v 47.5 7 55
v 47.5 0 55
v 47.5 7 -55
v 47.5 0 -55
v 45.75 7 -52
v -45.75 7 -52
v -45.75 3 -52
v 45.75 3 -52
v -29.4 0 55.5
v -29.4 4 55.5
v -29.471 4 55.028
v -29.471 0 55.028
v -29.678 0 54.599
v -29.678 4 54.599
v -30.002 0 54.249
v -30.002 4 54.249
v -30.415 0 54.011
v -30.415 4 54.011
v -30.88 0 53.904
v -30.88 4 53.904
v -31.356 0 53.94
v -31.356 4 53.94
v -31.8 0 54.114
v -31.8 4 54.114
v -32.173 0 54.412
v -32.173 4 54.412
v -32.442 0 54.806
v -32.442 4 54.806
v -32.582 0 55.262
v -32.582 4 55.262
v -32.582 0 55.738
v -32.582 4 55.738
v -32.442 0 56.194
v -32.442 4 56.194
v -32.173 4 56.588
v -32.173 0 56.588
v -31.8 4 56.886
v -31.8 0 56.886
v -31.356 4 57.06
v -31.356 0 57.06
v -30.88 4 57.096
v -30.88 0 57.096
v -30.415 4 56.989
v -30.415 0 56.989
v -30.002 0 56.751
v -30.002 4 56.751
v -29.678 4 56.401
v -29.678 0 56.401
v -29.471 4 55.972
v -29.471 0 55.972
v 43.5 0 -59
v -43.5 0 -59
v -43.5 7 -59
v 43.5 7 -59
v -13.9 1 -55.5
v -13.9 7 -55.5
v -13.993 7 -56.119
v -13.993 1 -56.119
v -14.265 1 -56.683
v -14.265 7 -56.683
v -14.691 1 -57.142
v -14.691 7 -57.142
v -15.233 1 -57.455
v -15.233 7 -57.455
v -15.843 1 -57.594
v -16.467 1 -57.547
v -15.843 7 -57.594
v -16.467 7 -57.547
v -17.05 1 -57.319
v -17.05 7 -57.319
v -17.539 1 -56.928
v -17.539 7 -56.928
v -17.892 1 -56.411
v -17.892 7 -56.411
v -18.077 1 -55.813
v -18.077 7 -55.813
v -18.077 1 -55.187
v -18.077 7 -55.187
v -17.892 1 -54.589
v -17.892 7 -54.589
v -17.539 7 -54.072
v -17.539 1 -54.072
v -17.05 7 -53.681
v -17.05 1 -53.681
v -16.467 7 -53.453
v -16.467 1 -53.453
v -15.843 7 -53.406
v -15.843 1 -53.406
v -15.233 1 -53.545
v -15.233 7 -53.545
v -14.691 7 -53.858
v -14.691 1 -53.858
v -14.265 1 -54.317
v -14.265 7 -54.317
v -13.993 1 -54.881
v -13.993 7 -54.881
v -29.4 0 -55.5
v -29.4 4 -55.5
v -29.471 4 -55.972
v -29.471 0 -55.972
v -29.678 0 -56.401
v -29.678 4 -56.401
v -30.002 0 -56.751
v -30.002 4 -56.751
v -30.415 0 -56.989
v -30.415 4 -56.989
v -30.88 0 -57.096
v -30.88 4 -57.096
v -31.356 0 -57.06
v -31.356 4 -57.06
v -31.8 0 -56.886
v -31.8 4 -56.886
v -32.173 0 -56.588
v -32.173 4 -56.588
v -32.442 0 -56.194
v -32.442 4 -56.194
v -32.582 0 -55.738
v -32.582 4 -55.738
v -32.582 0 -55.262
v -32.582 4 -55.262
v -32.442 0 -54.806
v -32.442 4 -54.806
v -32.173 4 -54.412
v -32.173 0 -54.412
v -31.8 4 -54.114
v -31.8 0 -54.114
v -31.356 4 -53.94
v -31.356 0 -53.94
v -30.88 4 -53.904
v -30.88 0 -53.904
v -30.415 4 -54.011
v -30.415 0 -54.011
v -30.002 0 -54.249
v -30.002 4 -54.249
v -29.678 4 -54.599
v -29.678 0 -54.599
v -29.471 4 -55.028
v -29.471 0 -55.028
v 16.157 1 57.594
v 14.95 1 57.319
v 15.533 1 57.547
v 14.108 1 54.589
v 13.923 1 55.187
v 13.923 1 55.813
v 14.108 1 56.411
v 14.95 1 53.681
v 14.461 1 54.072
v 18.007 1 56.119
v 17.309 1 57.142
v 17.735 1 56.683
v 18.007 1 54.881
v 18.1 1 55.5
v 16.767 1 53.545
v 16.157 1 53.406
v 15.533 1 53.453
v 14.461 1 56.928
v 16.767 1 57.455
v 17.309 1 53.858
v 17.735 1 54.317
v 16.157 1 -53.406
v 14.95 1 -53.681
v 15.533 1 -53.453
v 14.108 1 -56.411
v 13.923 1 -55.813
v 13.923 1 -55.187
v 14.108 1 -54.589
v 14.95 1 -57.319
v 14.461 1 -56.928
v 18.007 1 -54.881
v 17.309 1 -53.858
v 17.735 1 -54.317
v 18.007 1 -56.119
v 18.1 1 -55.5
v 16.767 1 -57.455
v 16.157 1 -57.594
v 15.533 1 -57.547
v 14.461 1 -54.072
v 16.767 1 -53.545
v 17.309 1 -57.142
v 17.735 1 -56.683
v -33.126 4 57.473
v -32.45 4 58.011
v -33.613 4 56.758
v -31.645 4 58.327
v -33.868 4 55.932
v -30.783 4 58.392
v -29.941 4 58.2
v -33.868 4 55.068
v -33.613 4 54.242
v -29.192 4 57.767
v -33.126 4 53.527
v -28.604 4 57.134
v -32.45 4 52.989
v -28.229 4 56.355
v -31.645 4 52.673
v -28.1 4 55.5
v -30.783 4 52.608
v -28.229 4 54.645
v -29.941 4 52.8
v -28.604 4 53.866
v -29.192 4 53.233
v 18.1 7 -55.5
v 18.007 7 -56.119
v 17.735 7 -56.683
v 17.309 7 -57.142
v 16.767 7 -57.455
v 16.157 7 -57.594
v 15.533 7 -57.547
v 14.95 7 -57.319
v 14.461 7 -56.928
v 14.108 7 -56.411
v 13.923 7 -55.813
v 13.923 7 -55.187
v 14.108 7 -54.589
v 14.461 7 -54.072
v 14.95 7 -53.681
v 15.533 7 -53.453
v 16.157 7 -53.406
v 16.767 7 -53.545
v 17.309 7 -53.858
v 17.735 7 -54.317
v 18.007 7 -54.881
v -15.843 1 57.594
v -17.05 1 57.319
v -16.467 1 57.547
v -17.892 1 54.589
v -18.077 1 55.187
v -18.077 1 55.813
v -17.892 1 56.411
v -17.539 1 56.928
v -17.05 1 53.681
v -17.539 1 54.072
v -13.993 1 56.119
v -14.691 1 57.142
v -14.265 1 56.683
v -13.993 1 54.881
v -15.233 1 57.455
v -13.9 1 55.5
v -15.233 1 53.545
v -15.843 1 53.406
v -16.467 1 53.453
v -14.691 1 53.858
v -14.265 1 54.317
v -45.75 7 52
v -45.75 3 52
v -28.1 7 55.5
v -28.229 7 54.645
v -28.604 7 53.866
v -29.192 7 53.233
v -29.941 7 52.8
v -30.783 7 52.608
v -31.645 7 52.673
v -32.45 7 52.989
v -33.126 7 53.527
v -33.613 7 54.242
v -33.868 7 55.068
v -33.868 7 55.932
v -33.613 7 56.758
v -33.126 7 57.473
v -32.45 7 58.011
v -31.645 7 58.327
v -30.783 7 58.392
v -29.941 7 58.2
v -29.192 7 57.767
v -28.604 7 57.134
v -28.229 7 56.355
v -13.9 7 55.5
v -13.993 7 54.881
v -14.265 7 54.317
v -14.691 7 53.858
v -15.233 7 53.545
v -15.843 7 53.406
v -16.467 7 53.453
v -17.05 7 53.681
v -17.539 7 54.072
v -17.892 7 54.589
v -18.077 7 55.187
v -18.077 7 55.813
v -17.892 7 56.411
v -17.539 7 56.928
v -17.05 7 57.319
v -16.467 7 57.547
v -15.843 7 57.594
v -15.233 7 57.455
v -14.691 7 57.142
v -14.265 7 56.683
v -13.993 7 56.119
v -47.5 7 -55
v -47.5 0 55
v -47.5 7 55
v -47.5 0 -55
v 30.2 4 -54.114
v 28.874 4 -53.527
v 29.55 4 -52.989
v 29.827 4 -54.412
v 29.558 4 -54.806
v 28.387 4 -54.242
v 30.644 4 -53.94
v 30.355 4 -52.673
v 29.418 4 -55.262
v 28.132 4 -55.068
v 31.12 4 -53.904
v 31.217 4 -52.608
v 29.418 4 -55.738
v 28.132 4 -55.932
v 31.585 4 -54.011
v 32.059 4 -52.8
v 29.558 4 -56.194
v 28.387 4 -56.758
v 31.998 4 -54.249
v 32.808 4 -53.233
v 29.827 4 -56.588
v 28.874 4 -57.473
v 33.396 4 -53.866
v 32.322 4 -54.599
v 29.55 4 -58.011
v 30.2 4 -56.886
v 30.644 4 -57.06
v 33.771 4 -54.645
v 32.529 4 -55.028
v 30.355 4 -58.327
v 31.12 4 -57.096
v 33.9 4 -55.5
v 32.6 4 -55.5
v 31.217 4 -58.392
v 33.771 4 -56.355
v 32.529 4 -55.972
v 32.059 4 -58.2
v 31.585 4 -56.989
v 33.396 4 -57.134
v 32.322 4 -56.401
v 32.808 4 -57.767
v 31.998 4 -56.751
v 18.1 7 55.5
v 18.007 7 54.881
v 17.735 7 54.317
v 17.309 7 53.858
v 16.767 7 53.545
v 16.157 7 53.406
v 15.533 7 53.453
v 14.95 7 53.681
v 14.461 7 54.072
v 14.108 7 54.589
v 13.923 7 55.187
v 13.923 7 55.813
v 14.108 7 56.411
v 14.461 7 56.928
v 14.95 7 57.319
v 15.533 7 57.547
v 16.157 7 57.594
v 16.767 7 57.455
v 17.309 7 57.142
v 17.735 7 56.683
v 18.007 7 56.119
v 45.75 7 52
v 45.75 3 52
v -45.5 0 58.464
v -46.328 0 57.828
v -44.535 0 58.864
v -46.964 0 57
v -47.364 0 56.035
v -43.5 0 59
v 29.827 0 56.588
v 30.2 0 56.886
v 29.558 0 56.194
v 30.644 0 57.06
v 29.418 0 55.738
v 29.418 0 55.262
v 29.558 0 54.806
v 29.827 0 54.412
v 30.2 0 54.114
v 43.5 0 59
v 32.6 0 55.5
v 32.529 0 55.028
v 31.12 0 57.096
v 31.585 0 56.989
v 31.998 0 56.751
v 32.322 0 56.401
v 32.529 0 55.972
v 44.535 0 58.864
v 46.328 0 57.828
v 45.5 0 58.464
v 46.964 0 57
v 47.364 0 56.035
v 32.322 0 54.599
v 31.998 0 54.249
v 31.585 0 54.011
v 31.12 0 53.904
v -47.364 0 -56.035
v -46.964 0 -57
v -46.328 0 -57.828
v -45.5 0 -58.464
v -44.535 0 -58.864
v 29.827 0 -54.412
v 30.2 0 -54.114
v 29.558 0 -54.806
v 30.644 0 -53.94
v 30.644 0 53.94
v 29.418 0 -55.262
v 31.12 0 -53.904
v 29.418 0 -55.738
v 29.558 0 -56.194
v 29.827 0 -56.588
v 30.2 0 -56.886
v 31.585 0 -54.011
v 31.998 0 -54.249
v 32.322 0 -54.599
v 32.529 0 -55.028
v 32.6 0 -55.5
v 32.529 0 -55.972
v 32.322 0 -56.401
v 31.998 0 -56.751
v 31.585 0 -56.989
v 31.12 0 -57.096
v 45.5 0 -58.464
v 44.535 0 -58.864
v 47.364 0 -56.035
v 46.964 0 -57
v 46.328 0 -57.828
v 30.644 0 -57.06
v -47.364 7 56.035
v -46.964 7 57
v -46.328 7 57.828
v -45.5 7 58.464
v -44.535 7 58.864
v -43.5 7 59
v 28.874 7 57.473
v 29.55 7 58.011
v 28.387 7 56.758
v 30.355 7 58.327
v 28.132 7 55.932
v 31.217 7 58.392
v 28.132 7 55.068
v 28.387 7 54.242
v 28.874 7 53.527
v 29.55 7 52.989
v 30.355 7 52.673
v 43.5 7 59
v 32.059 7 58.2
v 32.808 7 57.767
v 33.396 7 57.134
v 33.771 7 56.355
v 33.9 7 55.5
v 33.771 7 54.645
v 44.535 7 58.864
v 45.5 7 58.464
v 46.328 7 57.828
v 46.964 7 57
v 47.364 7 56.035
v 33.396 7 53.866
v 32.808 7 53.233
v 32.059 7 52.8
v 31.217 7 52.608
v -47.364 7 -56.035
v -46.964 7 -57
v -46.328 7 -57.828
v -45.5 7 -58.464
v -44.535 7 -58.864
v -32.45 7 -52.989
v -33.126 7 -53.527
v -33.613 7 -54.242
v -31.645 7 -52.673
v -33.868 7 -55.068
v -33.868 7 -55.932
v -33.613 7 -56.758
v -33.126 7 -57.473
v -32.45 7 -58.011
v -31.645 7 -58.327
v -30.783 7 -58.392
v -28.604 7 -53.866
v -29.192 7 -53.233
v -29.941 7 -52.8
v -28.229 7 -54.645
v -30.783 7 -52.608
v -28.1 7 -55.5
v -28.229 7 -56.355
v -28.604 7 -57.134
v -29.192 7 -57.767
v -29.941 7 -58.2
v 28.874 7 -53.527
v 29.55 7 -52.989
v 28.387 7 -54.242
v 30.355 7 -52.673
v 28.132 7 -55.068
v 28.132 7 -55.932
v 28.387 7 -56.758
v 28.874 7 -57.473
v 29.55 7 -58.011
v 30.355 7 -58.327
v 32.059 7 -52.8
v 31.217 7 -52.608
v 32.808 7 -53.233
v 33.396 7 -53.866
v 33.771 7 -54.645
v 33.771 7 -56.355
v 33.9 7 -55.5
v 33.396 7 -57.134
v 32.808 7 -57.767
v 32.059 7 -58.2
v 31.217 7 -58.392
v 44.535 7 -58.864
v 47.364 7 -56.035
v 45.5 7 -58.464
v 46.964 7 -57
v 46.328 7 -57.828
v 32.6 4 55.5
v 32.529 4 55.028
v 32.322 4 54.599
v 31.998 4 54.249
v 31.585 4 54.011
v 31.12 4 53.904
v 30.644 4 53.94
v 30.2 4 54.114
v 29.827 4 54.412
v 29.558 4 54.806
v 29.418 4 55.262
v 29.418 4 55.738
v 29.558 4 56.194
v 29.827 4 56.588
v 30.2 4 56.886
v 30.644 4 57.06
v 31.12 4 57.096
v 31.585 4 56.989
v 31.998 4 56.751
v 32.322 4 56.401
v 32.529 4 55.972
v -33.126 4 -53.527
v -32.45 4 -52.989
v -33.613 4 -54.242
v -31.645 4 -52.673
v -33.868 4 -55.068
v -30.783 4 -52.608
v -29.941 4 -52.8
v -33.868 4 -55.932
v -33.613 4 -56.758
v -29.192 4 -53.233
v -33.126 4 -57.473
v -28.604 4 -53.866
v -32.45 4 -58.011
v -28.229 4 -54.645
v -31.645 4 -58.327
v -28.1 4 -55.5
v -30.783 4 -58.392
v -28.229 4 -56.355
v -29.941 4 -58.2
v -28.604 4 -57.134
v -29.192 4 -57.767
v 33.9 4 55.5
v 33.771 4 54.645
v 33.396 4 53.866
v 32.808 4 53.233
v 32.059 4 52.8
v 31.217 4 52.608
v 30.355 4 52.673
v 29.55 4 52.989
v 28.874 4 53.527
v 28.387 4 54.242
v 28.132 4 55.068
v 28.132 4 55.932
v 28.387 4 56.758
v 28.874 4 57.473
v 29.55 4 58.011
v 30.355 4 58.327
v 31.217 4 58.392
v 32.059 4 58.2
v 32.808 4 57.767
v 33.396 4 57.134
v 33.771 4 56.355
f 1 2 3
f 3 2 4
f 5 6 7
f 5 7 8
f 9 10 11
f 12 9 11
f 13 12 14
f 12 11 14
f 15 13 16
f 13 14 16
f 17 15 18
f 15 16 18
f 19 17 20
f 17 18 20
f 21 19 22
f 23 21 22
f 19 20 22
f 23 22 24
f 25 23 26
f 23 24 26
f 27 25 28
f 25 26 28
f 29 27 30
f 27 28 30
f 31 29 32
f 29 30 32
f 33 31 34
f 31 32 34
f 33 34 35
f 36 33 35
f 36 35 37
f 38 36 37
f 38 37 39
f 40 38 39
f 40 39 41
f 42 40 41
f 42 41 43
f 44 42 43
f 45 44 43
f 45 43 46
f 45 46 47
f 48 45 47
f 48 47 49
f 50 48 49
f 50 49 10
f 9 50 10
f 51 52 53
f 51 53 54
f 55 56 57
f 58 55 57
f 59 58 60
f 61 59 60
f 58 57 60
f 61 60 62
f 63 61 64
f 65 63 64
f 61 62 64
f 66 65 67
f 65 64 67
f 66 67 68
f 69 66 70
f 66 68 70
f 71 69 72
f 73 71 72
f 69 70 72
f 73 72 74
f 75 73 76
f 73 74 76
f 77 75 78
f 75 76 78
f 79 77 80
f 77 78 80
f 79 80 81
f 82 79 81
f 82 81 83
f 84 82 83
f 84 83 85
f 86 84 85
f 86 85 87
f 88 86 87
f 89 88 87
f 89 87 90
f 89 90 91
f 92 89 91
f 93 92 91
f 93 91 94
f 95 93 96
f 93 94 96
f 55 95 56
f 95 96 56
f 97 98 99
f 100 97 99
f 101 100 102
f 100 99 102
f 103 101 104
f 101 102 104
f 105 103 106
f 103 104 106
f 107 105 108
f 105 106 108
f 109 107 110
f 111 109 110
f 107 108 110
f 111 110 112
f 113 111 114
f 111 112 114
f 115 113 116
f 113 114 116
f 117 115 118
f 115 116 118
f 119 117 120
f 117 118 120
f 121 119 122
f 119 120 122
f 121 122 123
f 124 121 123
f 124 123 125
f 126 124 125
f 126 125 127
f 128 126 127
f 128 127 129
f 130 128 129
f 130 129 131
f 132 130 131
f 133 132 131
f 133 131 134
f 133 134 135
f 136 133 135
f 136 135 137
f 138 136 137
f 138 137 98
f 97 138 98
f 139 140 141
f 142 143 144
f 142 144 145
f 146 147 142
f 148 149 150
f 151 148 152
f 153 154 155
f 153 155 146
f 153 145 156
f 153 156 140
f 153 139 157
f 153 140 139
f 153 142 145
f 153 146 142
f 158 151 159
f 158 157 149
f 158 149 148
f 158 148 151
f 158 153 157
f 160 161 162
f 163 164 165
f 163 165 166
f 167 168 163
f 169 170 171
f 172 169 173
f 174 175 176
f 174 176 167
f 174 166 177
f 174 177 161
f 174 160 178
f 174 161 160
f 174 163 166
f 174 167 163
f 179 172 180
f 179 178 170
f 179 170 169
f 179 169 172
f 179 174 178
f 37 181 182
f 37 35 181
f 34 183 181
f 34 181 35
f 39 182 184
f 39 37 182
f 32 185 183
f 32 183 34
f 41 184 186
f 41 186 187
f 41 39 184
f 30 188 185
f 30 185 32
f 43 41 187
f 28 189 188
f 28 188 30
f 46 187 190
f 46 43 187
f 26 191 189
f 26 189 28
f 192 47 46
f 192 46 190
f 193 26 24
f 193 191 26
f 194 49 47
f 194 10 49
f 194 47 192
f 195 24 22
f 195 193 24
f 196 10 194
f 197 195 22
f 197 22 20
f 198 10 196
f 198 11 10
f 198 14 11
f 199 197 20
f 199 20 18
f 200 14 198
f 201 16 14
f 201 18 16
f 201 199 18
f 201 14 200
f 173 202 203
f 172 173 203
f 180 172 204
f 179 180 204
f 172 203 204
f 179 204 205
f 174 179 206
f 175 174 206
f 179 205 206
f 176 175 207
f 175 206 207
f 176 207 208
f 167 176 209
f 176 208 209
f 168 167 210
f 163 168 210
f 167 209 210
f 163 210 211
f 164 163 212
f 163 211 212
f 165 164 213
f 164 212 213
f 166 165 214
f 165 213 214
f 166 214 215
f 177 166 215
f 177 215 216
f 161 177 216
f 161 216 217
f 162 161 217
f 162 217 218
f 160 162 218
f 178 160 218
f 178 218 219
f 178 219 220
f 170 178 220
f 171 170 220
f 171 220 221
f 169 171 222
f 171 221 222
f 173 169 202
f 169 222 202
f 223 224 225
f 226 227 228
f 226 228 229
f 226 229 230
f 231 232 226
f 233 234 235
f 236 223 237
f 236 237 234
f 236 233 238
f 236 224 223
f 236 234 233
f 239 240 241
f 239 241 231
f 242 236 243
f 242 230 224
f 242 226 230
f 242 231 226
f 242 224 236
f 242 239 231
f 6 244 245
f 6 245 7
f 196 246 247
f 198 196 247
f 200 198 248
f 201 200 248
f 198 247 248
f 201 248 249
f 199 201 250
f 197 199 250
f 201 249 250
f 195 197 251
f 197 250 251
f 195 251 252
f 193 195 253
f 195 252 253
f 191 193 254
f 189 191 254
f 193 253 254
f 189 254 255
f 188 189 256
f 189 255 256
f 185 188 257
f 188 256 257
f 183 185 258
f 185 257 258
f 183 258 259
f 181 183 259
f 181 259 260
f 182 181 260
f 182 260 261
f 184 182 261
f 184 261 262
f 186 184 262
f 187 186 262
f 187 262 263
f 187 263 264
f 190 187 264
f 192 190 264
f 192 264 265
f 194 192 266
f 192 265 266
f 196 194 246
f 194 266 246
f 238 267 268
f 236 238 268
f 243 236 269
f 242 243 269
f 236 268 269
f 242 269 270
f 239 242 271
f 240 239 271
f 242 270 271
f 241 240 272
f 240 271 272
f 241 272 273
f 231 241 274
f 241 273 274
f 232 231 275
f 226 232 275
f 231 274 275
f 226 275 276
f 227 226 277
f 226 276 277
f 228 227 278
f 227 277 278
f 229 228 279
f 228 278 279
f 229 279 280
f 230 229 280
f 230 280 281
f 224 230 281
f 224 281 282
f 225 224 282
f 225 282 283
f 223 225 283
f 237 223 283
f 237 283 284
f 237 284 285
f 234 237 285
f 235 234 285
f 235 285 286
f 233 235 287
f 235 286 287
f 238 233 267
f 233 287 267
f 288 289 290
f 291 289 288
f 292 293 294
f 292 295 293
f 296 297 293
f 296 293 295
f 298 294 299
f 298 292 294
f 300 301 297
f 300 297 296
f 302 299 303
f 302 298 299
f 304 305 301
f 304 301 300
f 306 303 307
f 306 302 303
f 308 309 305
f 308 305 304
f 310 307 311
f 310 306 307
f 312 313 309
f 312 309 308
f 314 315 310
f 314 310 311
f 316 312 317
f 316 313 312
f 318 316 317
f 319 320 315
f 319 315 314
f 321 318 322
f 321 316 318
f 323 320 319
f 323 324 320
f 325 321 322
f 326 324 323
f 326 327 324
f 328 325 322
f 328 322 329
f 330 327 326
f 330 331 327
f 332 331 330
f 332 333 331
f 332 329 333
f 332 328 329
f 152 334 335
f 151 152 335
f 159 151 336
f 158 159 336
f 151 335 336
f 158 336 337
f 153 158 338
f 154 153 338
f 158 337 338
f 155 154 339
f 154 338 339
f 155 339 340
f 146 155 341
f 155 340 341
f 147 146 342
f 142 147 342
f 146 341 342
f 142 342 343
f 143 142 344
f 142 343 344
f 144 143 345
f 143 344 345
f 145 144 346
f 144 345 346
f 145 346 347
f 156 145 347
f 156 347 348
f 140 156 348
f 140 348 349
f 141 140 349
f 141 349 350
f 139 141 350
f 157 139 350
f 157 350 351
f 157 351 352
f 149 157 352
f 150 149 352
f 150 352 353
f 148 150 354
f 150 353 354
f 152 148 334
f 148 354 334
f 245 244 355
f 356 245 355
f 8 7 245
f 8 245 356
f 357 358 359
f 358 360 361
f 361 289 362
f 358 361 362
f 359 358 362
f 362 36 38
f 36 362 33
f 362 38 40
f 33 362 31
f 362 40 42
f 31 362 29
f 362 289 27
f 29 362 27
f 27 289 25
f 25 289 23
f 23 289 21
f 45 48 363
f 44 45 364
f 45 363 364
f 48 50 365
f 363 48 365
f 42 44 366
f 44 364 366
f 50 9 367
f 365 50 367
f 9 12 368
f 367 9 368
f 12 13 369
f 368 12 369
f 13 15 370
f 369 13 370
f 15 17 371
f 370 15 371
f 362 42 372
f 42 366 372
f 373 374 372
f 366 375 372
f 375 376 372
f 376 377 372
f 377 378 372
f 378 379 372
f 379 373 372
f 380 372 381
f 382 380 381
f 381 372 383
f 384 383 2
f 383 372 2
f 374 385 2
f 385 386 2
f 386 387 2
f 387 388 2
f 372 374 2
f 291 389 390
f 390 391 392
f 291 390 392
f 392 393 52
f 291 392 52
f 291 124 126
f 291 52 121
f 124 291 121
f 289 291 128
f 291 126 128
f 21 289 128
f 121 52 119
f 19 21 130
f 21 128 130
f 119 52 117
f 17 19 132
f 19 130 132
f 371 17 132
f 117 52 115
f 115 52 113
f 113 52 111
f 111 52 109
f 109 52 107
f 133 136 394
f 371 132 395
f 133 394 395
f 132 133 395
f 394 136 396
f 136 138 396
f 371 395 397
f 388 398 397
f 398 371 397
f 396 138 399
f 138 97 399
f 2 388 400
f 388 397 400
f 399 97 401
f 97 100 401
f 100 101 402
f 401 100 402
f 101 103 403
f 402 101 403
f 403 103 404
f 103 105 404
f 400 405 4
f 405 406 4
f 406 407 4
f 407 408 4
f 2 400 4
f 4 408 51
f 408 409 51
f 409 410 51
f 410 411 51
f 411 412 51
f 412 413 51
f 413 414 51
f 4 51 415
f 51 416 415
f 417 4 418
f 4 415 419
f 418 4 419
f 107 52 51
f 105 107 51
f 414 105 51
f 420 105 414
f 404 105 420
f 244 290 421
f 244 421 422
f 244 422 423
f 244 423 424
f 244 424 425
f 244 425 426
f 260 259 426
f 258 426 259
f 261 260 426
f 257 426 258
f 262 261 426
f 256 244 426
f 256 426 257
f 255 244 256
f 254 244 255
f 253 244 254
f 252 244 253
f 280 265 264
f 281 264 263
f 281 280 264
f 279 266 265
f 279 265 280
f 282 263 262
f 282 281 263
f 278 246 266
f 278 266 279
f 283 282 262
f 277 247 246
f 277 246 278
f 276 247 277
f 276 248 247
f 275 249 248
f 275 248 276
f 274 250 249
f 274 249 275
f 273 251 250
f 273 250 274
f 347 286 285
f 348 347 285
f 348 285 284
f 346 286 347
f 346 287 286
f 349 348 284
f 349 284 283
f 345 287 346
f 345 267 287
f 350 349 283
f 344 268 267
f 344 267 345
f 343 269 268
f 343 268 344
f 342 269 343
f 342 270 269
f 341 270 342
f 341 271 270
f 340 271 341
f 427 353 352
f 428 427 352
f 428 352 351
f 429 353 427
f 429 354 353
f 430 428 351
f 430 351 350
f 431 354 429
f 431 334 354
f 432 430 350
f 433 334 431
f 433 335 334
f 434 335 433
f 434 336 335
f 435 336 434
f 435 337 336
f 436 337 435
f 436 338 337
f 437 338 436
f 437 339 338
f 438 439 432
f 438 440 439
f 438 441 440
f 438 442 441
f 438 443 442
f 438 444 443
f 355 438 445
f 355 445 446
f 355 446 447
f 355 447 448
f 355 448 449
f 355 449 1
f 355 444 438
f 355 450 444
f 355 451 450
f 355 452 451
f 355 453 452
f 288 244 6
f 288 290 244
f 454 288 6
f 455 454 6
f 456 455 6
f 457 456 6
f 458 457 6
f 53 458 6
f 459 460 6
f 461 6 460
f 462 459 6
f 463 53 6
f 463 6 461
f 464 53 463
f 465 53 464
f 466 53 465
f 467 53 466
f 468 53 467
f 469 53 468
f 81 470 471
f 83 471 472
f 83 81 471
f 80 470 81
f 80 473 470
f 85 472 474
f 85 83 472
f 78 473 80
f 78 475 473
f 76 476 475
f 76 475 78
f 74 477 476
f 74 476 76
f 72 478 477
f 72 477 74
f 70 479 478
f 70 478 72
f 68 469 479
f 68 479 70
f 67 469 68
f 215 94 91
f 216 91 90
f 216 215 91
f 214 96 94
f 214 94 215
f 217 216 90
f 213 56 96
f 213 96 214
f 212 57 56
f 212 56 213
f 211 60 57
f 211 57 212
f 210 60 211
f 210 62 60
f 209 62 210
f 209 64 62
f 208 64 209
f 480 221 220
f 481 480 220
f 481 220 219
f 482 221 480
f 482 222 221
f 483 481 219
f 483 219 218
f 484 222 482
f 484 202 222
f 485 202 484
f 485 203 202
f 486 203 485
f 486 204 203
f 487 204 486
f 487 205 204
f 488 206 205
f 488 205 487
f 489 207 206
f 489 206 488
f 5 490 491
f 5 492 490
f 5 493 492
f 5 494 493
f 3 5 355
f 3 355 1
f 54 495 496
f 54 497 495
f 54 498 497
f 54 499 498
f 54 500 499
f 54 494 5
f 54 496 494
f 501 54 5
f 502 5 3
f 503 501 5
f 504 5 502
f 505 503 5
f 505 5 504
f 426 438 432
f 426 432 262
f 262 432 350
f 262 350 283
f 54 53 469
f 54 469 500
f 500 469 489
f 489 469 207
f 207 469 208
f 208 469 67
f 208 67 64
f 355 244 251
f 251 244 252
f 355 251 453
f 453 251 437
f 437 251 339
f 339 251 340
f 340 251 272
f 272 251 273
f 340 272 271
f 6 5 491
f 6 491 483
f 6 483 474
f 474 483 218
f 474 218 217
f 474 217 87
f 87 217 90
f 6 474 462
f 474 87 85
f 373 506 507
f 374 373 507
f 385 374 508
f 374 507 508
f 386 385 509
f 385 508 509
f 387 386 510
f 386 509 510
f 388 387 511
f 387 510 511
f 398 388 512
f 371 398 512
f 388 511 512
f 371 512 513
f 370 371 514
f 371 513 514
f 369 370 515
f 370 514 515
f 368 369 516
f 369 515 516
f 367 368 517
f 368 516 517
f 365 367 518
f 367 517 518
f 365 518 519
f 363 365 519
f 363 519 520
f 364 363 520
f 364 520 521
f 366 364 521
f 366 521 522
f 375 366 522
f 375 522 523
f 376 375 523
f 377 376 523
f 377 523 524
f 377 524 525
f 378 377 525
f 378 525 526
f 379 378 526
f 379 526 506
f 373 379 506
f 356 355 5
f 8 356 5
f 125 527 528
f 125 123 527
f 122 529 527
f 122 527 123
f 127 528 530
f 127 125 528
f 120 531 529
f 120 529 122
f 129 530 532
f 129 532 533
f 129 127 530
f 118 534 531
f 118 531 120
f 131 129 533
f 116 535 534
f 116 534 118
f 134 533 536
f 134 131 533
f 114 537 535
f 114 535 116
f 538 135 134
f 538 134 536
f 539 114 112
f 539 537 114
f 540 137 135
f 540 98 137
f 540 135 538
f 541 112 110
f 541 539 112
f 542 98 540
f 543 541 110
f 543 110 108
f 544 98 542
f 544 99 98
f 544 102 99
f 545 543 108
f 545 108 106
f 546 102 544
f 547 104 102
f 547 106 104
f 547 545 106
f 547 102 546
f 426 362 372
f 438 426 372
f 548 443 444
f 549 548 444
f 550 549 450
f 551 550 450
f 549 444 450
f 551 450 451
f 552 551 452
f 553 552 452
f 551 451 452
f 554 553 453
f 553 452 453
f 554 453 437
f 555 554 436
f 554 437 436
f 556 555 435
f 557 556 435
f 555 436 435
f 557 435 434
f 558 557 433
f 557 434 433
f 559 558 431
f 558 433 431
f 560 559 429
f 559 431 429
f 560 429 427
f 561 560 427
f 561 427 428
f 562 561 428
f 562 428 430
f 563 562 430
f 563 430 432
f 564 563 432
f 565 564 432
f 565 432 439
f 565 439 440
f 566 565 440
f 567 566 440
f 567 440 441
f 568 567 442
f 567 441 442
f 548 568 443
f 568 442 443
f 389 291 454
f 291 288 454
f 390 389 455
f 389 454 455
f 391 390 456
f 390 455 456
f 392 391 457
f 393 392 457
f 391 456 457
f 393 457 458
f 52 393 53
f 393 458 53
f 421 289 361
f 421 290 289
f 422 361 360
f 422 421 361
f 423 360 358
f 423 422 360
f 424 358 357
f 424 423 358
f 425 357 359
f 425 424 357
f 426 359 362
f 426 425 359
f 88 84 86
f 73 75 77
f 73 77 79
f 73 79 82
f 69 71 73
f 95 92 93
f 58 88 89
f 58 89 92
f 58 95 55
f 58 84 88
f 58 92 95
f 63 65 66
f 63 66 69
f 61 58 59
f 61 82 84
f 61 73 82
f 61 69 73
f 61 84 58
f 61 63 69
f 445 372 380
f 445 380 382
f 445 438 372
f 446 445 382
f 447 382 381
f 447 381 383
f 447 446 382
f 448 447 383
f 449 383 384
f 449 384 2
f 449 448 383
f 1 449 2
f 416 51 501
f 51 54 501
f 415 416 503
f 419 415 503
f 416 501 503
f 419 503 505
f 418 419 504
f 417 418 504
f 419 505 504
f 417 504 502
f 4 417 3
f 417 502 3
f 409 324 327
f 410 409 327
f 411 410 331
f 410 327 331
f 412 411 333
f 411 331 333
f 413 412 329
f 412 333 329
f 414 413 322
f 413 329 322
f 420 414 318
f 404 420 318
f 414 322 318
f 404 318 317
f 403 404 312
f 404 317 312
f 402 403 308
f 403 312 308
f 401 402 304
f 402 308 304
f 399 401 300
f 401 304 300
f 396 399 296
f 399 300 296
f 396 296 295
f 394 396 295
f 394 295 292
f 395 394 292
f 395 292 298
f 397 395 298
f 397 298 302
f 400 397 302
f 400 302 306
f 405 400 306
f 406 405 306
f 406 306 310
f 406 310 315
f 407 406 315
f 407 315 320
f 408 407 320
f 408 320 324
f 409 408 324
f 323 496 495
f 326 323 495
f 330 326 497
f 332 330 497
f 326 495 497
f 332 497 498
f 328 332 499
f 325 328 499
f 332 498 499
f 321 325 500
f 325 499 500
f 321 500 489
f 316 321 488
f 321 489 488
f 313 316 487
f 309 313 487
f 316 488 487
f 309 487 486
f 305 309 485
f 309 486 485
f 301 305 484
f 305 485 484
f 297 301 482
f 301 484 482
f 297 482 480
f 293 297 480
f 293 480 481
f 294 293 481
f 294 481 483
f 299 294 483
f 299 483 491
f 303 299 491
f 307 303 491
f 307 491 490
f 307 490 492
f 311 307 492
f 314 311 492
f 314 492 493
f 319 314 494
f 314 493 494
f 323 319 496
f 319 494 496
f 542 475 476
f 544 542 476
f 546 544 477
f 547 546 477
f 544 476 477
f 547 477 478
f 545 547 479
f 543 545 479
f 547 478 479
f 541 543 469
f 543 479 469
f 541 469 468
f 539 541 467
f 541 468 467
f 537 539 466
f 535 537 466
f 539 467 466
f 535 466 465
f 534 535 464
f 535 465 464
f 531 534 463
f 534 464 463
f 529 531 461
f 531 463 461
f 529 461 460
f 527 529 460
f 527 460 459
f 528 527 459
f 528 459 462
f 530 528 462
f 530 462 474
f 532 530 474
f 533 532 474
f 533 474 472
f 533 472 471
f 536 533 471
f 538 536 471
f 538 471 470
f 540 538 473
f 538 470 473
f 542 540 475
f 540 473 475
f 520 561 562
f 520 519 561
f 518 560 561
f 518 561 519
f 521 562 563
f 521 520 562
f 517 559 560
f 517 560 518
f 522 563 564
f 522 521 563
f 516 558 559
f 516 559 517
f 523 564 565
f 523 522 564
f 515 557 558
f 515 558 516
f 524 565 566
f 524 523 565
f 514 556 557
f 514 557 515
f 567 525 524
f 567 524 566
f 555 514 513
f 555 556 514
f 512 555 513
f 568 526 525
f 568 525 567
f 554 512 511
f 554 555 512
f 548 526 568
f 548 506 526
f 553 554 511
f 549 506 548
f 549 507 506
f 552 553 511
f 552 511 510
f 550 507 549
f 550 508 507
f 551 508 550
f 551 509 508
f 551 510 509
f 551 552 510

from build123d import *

# Parameters (mm, degrees)
SZKIC1_W                    = 95
SZKIC1_H                    = 118
DODANIE_WYCI_GNI_CIE1_DEPTH = 7
SZKIC2_W                    = 91.5
SZKIC2_H                    = 104
WYTNIJ_WYCI_GNI_CIE1_DEPTH  = 4
SZKIC4_R                    = 1.6
WYTNIJ_WYCI_GNI_CIE3_DEPTH  = 8
ZAOKR_GLENIE1_R             = 4
SZKIC5_R                    = 2.9
WYTNIJ_WYCI_GNI_CIE4_DEPTH  = 3
SZKIC6_R                    = 2.1
WYTNIJ_WYCI_GNI_CIE5_DEPTH  = 6


with BuildPart() as part:
    # Szkic1 → Dodanie-wyciągnięcie1 (new body)
    with BuildSketch(Plane(origin=(0, 0, 0), x_dir=(1, 0, 0), z_dir=(0, 1, 0))):
        Rectangle(SZKIC1_W, SZKIC1_H)
    extrude(amount=DODANIE_WYCI_GNI_CIE1_DEPTH)

    # Szkic2 → Wytnij-wyciągnięcie1 (cut)
    with BuildSketch(Plane(origin=(0, 7, 0), x_dir=(1, 0, 0), z_dir=(0, 1, 0))):
        Rectangle(SZKIC2_W, SZKIC2_H)
    extrude(amount=-WYTNIJ_WYCI_GNI_CIE1_DEPTH, mode=Mode.SUBTRACT)

    # Szkic4 → Wytnij-wyciągnięcie3 (cut, through all)
    with BuildSketch(Plane(origin=(0, 7, 0), x_dir=(1, 0, 0), z_dir=(0, 1, 0))):
        with Locations((31, -55.5)):
            Circle(SZKIC4_R)
        with Locations((-31, -55.5)):
            Circle(SZKIC4_R)
        with Locations((31, 55.5)):
            Circle(SZKIC4_R)
        with Locations((-31, 55.5)):
            Circle(SZKIC4_R)
    extrude(amount=-WYTNIJ_WYCI_GNI_CIE3_DEPTH, mode=Mode.SUBTRACT)

    # Zaokrąglenie1
    zaokr_glenie1_edges = [part.edges().sort_by_distance(p)[0] for p in [
        (47.5, 3.5, 59),
        (-47.5, 3.5, 59),
        (-47.5, 3.5, -59),
        (47.5, 3.5, -59),
    ]]
    fillet(zaokr_glenie1_edges, radius=ZAOKR_GLENIE1_R)

    # Szkic5 → Wytnij-wyciągnięcie4 (cut)
    with BuildSketch(Plane(origin=(0, 7, 0), x_dir=(1, 0, 0), z_dir=(0, 1, 0))):
        with Locations((-31, -55.5)):
            Circle(SZKIC5_R)
        with Locations((-31, 55.5)):
            Circle(SZKIC5_R)
        with Locations((31, -55.5)):
            Circle(SZKIC5_R)
        with Locations((31, 55.5)):
            Circle(SZKIC5_R)
    extrude(amount=-WYTNIJ_WYCI_GNI_CIE4_DEPTH, mode=Mode.SUBTRACT)

    # Szkic6 → Wytnij-wyciągnięcie5 (cut)
    with BuildSketch(Plane(origin=(0, 7, 0), x_dir=(1, 0, 0), z_dir=(0, 1, 0))):
        with Locations((-16, -55.5)):
            Circle(SZKIC6_R)
        with Locations((-16, 55.5)):
            Circle(SZKIC6_R)
        with Locations((16, 55.5)):
            Circle(SZKIC6_R)
        with Locations((16, -55.5)):
            Circle(SZKIC6_R)
    extrude(amount=-WYTNIJ_WYCI_GNI_CIE5_DEPTH, mode=Mode.SUBTRACT)


solid = part.part
